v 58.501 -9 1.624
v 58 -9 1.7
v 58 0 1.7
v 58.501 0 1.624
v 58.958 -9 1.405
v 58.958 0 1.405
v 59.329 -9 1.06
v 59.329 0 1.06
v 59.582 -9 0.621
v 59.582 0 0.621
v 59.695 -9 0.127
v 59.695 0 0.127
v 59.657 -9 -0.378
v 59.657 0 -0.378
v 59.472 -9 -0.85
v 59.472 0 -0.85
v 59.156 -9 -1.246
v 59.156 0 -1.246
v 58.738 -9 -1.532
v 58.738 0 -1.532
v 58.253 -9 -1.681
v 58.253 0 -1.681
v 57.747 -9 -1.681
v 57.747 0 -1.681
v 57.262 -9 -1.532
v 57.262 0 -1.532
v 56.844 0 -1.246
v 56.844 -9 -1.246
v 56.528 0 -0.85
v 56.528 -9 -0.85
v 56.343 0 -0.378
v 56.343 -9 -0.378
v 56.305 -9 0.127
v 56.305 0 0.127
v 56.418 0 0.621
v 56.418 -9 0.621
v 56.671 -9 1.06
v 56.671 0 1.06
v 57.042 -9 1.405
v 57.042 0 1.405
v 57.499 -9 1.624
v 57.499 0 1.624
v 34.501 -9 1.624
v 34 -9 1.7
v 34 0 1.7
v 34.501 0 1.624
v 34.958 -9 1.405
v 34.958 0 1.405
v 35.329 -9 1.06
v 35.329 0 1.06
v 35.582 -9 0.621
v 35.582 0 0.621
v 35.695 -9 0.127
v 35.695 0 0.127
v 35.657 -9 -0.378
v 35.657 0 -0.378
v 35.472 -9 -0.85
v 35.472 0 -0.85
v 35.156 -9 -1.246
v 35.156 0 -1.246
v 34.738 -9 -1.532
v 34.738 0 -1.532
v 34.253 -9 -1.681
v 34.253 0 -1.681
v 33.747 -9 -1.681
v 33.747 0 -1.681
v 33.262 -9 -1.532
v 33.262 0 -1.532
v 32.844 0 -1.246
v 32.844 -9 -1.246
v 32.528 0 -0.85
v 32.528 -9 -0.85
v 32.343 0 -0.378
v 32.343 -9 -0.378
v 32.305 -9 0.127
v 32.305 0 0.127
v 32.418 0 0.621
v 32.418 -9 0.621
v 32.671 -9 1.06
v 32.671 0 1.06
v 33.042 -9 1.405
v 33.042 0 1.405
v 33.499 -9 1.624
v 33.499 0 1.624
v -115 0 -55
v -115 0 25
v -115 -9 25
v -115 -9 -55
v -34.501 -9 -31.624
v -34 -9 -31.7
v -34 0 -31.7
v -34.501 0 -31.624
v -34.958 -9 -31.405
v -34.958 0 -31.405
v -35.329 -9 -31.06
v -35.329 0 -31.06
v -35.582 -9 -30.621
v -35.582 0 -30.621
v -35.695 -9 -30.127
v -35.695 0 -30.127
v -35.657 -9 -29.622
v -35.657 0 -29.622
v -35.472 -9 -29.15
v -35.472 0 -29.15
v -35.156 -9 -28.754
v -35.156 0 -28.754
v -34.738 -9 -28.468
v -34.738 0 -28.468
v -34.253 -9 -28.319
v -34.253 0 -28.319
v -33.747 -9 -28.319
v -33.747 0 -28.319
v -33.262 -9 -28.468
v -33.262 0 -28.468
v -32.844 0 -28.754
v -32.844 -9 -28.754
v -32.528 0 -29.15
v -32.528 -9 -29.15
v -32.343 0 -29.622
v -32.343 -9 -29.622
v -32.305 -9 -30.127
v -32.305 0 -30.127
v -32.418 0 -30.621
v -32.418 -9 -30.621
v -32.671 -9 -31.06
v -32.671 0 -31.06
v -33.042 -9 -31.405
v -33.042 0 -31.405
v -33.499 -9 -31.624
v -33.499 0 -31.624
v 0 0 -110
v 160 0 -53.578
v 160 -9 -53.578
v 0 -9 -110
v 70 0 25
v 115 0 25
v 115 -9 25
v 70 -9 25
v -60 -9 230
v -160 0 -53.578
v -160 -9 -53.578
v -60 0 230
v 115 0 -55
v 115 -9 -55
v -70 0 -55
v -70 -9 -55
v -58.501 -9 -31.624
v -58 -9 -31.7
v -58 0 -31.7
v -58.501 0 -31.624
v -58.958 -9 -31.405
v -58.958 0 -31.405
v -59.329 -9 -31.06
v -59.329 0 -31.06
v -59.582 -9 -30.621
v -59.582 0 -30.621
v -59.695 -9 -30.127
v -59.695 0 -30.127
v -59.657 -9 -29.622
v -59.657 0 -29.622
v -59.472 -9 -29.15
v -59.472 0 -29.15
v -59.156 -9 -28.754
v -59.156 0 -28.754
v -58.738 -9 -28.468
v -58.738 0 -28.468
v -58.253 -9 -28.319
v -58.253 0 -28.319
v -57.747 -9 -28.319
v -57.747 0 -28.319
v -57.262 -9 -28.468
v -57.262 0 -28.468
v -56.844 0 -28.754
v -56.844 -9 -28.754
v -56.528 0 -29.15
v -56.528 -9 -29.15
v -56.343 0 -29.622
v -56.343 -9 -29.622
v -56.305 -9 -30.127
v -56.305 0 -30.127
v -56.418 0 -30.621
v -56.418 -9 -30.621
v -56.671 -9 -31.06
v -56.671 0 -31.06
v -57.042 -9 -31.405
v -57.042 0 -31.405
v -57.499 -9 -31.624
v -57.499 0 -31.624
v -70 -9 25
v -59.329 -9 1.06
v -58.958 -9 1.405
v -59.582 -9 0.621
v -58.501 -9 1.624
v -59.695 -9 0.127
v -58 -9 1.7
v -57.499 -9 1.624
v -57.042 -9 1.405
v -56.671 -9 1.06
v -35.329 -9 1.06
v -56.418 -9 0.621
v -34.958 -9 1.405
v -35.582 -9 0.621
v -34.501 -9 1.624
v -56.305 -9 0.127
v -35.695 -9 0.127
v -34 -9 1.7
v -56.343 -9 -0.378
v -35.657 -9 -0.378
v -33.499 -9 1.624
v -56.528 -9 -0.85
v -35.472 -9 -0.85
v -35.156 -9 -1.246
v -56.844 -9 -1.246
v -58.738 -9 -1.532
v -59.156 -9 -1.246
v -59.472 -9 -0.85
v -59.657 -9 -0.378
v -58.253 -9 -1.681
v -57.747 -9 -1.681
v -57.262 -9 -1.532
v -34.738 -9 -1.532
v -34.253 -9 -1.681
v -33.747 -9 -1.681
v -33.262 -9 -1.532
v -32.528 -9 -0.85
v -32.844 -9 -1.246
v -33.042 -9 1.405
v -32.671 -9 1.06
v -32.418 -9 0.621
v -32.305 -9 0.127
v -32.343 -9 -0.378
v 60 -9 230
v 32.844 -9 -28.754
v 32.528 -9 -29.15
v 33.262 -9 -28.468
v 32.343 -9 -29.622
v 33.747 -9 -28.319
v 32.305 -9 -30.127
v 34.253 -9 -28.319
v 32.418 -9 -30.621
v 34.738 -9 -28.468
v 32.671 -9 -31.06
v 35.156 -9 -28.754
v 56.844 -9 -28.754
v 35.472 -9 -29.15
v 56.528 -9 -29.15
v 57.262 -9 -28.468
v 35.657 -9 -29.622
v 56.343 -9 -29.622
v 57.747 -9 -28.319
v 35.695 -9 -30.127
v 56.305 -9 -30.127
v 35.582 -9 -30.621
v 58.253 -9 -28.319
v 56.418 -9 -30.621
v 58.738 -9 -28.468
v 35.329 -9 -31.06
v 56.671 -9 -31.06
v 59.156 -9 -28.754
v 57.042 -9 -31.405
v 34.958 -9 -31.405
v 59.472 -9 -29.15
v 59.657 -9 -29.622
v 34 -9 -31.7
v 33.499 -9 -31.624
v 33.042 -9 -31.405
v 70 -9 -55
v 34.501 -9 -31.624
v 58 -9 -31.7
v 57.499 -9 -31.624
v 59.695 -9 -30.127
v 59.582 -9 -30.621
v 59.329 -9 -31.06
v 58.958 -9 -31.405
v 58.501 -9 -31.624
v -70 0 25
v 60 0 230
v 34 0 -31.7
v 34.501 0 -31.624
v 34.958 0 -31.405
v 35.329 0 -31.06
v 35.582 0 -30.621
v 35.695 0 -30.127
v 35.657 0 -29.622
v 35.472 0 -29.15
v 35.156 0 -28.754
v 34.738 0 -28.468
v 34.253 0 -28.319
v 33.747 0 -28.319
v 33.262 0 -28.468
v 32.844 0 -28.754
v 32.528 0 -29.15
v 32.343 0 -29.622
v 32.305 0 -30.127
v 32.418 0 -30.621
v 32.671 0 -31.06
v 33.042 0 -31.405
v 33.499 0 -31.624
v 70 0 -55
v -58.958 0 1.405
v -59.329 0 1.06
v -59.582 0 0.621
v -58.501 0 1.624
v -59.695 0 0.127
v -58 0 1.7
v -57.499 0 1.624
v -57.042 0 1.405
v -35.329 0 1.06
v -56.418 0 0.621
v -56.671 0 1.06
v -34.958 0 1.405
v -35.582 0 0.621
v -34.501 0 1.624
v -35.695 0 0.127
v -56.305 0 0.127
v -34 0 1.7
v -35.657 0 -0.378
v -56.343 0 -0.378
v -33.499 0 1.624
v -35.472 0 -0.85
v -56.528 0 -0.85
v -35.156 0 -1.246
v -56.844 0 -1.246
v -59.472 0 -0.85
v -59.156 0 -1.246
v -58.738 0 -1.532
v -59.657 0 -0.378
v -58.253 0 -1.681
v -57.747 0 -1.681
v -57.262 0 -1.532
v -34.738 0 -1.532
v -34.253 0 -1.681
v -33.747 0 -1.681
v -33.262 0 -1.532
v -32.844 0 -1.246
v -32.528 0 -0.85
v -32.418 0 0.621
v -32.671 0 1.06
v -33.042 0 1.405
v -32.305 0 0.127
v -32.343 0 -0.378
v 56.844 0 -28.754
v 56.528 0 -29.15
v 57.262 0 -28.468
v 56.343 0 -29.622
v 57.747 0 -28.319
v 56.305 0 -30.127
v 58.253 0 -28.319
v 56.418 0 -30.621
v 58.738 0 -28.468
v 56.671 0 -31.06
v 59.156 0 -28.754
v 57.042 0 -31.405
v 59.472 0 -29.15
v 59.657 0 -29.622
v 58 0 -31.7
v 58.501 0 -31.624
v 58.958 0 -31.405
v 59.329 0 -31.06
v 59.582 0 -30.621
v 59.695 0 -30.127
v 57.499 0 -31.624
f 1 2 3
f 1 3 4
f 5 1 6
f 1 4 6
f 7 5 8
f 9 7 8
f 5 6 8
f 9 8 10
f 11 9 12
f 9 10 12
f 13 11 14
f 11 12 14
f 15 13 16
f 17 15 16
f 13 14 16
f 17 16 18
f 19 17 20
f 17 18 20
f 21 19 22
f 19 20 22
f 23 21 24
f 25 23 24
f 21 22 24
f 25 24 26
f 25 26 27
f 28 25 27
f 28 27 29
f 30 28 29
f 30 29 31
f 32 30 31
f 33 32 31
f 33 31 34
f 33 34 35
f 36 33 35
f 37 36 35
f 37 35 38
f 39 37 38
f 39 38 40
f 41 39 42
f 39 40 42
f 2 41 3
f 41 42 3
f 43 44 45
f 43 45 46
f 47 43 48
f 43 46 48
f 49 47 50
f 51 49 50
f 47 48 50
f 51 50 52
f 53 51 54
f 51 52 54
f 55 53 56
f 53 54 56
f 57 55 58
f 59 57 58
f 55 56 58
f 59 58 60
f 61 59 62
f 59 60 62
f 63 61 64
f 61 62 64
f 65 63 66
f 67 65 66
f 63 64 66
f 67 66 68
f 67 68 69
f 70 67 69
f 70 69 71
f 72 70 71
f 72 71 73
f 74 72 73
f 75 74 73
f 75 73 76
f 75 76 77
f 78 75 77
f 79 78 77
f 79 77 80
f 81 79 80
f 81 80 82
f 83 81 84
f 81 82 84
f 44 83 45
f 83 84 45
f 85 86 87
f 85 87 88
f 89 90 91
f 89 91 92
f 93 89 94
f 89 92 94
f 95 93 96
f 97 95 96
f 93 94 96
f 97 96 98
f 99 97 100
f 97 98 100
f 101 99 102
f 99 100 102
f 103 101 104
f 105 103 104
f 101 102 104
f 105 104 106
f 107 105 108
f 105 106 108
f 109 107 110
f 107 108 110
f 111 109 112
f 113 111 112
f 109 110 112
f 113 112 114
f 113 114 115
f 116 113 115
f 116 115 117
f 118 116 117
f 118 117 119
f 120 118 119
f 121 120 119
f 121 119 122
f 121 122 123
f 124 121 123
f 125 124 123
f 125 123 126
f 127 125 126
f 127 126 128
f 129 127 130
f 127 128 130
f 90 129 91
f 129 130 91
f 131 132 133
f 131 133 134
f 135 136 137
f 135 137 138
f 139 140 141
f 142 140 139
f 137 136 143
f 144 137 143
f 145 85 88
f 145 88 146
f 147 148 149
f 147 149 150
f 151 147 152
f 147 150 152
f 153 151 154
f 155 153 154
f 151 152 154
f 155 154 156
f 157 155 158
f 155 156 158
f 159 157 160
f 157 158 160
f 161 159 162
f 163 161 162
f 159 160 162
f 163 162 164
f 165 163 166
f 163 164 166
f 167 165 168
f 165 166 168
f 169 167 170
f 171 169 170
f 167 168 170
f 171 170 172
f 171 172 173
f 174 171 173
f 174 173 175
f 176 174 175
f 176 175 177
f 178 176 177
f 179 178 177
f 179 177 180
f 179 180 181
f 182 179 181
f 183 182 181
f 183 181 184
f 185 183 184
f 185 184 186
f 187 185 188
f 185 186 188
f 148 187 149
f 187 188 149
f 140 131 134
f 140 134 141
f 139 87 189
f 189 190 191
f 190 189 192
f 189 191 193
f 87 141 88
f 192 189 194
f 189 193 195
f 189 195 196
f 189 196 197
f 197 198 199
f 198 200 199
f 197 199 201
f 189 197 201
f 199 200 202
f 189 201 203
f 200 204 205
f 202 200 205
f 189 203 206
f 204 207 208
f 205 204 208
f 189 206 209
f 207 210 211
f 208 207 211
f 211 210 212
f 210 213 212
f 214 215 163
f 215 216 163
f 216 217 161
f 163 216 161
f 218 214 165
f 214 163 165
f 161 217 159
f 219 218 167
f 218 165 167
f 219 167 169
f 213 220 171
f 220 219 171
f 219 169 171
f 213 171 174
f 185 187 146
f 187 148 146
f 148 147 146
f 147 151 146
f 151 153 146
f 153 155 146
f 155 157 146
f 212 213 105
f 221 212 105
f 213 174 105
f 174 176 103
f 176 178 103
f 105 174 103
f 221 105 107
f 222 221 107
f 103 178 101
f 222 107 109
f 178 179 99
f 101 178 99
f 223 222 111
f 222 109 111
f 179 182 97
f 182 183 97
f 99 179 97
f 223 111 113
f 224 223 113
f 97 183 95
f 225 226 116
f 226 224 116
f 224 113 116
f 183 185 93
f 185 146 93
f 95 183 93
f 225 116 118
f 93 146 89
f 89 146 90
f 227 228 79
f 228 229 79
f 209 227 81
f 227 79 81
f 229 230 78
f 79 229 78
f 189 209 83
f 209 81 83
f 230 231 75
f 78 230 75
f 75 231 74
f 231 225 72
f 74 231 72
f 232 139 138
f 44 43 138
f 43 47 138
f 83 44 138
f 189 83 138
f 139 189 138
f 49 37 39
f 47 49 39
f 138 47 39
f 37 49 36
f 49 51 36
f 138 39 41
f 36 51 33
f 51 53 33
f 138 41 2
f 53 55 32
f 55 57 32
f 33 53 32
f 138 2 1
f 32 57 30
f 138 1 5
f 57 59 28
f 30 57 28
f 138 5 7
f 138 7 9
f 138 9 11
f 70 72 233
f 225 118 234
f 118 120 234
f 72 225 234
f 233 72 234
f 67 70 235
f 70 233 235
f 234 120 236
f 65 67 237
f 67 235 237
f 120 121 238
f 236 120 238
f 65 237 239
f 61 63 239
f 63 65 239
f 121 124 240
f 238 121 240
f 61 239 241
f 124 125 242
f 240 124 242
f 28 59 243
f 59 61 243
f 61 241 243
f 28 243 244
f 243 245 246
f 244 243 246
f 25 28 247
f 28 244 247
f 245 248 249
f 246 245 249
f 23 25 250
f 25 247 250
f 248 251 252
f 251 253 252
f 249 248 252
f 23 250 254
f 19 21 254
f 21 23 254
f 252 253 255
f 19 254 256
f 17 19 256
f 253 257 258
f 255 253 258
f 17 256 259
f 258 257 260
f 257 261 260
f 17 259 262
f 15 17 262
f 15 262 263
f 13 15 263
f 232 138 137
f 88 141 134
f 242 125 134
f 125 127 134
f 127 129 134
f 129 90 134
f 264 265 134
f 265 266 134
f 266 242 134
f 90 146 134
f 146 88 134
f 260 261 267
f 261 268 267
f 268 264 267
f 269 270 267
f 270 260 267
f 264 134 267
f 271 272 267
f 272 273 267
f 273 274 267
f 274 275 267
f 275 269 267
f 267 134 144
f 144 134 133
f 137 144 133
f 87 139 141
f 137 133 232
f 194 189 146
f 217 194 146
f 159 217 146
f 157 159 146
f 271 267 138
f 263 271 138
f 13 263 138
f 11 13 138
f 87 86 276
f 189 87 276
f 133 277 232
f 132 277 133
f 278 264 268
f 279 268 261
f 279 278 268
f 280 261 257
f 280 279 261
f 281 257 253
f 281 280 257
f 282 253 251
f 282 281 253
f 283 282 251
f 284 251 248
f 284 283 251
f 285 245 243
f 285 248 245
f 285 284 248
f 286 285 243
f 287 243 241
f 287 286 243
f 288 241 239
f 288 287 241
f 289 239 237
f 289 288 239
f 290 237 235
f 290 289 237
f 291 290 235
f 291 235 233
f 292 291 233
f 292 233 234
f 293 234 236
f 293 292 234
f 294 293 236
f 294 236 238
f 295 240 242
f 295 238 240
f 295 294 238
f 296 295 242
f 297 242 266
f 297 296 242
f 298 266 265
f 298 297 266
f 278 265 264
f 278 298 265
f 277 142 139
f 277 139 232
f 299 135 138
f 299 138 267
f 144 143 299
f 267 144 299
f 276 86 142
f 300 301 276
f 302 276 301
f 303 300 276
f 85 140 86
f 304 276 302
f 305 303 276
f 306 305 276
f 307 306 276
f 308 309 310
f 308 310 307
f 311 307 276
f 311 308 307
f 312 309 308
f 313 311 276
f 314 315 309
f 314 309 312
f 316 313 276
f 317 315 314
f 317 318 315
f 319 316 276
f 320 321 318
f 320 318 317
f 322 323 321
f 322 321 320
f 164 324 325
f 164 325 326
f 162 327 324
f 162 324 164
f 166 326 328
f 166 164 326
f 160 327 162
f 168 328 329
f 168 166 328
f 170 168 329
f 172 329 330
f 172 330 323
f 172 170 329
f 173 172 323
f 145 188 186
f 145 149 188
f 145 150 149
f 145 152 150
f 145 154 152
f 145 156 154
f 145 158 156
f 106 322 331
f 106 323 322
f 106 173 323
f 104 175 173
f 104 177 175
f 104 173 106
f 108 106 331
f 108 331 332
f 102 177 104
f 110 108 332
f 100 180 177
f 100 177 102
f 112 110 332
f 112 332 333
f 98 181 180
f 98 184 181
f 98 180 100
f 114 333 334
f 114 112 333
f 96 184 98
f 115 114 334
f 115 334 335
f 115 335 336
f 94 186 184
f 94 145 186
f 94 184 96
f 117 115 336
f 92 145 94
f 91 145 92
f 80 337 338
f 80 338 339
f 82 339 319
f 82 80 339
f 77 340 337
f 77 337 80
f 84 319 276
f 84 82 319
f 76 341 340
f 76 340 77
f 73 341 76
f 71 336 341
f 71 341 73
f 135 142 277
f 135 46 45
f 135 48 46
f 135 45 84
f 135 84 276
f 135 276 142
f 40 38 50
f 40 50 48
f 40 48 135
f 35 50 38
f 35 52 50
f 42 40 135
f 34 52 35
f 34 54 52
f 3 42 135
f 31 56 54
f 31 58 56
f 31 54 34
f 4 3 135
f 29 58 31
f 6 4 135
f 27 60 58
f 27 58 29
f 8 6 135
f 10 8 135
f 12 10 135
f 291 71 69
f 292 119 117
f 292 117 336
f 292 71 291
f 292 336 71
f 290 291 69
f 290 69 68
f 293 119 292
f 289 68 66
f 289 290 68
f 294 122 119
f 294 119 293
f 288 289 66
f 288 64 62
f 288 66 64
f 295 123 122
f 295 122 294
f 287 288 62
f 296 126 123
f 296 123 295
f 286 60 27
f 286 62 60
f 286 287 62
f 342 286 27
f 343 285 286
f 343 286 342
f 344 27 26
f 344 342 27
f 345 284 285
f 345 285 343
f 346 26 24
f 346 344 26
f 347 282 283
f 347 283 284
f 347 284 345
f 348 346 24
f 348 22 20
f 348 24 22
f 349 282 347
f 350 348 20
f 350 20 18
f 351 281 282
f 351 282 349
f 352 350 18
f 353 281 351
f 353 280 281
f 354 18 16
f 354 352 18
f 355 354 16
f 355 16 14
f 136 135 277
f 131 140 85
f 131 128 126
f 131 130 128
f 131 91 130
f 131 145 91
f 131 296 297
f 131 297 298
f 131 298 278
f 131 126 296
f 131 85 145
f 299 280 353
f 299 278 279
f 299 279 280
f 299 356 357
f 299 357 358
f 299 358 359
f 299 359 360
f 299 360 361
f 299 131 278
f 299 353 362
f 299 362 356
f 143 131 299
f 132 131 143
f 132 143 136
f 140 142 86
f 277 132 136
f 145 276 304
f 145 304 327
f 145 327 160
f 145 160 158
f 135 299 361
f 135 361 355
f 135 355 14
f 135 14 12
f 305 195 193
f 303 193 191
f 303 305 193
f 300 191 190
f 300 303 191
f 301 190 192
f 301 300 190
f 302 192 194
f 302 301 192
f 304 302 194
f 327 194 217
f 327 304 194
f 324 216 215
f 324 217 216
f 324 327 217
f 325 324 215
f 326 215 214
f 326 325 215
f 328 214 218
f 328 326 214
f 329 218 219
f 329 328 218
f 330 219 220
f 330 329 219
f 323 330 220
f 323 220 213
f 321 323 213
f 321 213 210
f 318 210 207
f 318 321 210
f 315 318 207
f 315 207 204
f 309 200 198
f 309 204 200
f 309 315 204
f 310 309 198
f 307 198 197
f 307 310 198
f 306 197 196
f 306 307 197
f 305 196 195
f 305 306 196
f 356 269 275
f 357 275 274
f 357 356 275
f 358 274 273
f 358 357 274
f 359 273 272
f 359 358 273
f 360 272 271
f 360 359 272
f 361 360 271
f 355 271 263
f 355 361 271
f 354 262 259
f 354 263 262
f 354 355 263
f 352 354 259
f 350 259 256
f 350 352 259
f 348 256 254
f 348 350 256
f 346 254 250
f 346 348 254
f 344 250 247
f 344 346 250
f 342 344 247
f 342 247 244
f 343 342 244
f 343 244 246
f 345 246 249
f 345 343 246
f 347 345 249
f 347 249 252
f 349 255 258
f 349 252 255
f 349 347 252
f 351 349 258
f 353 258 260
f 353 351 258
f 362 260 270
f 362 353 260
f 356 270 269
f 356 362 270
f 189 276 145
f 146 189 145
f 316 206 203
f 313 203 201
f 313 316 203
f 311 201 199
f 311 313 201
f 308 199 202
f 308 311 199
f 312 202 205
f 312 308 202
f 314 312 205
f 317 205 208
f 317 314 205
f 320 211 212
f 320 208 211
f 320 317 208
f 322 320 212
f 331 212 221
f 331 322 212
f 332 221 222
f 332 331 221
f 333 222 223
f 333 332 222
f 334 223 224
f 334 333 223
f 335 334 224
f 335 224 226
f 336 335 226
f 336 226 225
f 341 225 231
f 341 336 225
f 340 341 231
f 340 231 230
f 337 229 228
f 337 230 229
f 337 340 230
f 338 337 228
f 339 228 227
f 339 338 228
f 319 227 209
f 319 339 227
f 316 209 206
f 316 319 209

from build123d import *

# Parameters (mm, degrees)
BOSS_EXTRU_1_DEPTH        = 9
ESQUISSE2_W               = 45
ESQUISSE2_H               = 80
ENL_V_MAT_EXTRU_2_DEPTH   = 9
D_GAGEMENT_M31_AT_2_COUNT = 2
D_GAGEMENT_M31_AT_2_PITCH = 24


with BuildPart() as part:
    # Esquisse1 → Boss.-Extru.1 (new body)
    with BuildSketch(Plane(origin=(0, 0, 0), x_dir=(1, 0, 0), z_dir=(0, 1, 0))):
        Polygon((0, 110), (-160, 53.578166916), (-60, -230), (60, -230), (160, 53.578166916), align=None)
    extrude(amount=-BOSS_EXTRU_1_DEPTH)

    # Esquisse2 → Enlèv. mat.-Extru.2 (cut)
    with BuildSketch(Plane(origin=(0, 0, 0), x_dir=(1, 0, 0), z_dir=(0, 1, 0))):
        with Locations((-92.5, 15)):
            Rectangle(ESQUISSE2_W, ESQUISSE2_H)
    enl_v_mat_extru_2 = extrude(amount=-ENL_V_MAT_EXTRU_2_DEPTH, mode=Mode.SUBTRACT)

    # Symétrie1: Enlèv. mat.-Extru.2 across plane
    add(enl_v_mat_extru_2.mirror(Plane(origin=(0, 0, 0), x_dir=(0, 0, 1), z_dir=(1, 0, 0))), mode=Mode.SUBTRACT)

    # Esquisse4 → Dégagement M31 (revolve, cut)
    with BuildSketch(Plane(origin=(-58, 0, 0), x_dir=(0, 0, 1), z_dir=(1, 0, 0))):
        Polygon((0, 0), (0, 11.021463052), (1.7, 10), (1.7, 0), align=None)
    d_gagement_m31 = revolve(axis=Axis((-58, 6.35, 0), (0, -1, 0)), mode=Mode.SUBTRACT)

    # Dégagement M31 at 2: Dégagement M31 ×2
    with Locations(*[(i * D_GAGEMENT_M31_AT_2_PITCH, 0, 0) for i in range(1, D_GAGEMENT_M31_AT_2_COUNT)]):
        add(d_gagement_m31, mode=Mode.SUBTRACT)

    # Symétrie2: Dégagement M31 across plane
    add(d_gagement_m31.mirror(Plane.XY.offset(-15)), mode=Mode.SUBTRACT)

    # Symétrie2 copy 1 sketch → Symétrie2 copy 1 (revolve, cut)
    with BuildSketch(Plane(origin=(-34, 0, -30), x_dir=(0, 0, -1), z_dir=(1, 0, 0))):
        Polygon((0, 0), (0, -11.021463052), (1.7, -10), (1.7, 0), align=None)
    revolve(axis=Axis((-34, 6.35, -30), (0, 1, 0)), mode=Mode.SUBTRACT)

    # Symétrie3: Dégagement M31 across plane
    add(d_gagement_m31.mirror(Plane(origin=(0, 0, 0), x_dir=(0, 0, 1), z_dir=(1, 0, 0))), mode=Mode.SUBTRACT)

    # Symétrie3 copy 1 sketch → Symétrie3 copy 1 (revolve, cut)
    with BuildSketch(Plane(origin=(58, 0, -30), x_dir=(0, 0, -1), z_dir=(-1, 0, 0))):
        Polygon((0, 0), (0, 11.021463052), (1.7, 10), (1.7, 0), align=None)
    revolve(axis=Axis((58, 6.35, -30), (0, -1, 0)), mode=Mode.SUBTRACT)

    # Symétrie3 copy 2 sketch → Symétrie3 copy 2 (revolve, cut)
    with BuildSketch(Plane(origin=(34, 0, -30), x_dir=(0, 0, -1), z_dir=(-1, 0, 0))):
        Polygon((0, 0), (0, 11.021463052), (1.7, 10), (1.7, 0), align=None)
    revolve(axis=Axis((34, 6.35, -30), (0, -1, 0)), mode=Mode.SUBTRACT)

    # Symétrie3 copy 3 sketch → Symétrie3 copy 3 (revolve, cut)
    with BuildSketch(Plane.ZY.offset(-34)):
        Polygon((0, 0), (0, -11.021463052), (1.7, -10), (1.7, 0), align=None)
    revolve(axis=Axis((34, 6.35, 0), (0, 1, 0)), mode=Mode.SUBTRACT)


solid = part.part
